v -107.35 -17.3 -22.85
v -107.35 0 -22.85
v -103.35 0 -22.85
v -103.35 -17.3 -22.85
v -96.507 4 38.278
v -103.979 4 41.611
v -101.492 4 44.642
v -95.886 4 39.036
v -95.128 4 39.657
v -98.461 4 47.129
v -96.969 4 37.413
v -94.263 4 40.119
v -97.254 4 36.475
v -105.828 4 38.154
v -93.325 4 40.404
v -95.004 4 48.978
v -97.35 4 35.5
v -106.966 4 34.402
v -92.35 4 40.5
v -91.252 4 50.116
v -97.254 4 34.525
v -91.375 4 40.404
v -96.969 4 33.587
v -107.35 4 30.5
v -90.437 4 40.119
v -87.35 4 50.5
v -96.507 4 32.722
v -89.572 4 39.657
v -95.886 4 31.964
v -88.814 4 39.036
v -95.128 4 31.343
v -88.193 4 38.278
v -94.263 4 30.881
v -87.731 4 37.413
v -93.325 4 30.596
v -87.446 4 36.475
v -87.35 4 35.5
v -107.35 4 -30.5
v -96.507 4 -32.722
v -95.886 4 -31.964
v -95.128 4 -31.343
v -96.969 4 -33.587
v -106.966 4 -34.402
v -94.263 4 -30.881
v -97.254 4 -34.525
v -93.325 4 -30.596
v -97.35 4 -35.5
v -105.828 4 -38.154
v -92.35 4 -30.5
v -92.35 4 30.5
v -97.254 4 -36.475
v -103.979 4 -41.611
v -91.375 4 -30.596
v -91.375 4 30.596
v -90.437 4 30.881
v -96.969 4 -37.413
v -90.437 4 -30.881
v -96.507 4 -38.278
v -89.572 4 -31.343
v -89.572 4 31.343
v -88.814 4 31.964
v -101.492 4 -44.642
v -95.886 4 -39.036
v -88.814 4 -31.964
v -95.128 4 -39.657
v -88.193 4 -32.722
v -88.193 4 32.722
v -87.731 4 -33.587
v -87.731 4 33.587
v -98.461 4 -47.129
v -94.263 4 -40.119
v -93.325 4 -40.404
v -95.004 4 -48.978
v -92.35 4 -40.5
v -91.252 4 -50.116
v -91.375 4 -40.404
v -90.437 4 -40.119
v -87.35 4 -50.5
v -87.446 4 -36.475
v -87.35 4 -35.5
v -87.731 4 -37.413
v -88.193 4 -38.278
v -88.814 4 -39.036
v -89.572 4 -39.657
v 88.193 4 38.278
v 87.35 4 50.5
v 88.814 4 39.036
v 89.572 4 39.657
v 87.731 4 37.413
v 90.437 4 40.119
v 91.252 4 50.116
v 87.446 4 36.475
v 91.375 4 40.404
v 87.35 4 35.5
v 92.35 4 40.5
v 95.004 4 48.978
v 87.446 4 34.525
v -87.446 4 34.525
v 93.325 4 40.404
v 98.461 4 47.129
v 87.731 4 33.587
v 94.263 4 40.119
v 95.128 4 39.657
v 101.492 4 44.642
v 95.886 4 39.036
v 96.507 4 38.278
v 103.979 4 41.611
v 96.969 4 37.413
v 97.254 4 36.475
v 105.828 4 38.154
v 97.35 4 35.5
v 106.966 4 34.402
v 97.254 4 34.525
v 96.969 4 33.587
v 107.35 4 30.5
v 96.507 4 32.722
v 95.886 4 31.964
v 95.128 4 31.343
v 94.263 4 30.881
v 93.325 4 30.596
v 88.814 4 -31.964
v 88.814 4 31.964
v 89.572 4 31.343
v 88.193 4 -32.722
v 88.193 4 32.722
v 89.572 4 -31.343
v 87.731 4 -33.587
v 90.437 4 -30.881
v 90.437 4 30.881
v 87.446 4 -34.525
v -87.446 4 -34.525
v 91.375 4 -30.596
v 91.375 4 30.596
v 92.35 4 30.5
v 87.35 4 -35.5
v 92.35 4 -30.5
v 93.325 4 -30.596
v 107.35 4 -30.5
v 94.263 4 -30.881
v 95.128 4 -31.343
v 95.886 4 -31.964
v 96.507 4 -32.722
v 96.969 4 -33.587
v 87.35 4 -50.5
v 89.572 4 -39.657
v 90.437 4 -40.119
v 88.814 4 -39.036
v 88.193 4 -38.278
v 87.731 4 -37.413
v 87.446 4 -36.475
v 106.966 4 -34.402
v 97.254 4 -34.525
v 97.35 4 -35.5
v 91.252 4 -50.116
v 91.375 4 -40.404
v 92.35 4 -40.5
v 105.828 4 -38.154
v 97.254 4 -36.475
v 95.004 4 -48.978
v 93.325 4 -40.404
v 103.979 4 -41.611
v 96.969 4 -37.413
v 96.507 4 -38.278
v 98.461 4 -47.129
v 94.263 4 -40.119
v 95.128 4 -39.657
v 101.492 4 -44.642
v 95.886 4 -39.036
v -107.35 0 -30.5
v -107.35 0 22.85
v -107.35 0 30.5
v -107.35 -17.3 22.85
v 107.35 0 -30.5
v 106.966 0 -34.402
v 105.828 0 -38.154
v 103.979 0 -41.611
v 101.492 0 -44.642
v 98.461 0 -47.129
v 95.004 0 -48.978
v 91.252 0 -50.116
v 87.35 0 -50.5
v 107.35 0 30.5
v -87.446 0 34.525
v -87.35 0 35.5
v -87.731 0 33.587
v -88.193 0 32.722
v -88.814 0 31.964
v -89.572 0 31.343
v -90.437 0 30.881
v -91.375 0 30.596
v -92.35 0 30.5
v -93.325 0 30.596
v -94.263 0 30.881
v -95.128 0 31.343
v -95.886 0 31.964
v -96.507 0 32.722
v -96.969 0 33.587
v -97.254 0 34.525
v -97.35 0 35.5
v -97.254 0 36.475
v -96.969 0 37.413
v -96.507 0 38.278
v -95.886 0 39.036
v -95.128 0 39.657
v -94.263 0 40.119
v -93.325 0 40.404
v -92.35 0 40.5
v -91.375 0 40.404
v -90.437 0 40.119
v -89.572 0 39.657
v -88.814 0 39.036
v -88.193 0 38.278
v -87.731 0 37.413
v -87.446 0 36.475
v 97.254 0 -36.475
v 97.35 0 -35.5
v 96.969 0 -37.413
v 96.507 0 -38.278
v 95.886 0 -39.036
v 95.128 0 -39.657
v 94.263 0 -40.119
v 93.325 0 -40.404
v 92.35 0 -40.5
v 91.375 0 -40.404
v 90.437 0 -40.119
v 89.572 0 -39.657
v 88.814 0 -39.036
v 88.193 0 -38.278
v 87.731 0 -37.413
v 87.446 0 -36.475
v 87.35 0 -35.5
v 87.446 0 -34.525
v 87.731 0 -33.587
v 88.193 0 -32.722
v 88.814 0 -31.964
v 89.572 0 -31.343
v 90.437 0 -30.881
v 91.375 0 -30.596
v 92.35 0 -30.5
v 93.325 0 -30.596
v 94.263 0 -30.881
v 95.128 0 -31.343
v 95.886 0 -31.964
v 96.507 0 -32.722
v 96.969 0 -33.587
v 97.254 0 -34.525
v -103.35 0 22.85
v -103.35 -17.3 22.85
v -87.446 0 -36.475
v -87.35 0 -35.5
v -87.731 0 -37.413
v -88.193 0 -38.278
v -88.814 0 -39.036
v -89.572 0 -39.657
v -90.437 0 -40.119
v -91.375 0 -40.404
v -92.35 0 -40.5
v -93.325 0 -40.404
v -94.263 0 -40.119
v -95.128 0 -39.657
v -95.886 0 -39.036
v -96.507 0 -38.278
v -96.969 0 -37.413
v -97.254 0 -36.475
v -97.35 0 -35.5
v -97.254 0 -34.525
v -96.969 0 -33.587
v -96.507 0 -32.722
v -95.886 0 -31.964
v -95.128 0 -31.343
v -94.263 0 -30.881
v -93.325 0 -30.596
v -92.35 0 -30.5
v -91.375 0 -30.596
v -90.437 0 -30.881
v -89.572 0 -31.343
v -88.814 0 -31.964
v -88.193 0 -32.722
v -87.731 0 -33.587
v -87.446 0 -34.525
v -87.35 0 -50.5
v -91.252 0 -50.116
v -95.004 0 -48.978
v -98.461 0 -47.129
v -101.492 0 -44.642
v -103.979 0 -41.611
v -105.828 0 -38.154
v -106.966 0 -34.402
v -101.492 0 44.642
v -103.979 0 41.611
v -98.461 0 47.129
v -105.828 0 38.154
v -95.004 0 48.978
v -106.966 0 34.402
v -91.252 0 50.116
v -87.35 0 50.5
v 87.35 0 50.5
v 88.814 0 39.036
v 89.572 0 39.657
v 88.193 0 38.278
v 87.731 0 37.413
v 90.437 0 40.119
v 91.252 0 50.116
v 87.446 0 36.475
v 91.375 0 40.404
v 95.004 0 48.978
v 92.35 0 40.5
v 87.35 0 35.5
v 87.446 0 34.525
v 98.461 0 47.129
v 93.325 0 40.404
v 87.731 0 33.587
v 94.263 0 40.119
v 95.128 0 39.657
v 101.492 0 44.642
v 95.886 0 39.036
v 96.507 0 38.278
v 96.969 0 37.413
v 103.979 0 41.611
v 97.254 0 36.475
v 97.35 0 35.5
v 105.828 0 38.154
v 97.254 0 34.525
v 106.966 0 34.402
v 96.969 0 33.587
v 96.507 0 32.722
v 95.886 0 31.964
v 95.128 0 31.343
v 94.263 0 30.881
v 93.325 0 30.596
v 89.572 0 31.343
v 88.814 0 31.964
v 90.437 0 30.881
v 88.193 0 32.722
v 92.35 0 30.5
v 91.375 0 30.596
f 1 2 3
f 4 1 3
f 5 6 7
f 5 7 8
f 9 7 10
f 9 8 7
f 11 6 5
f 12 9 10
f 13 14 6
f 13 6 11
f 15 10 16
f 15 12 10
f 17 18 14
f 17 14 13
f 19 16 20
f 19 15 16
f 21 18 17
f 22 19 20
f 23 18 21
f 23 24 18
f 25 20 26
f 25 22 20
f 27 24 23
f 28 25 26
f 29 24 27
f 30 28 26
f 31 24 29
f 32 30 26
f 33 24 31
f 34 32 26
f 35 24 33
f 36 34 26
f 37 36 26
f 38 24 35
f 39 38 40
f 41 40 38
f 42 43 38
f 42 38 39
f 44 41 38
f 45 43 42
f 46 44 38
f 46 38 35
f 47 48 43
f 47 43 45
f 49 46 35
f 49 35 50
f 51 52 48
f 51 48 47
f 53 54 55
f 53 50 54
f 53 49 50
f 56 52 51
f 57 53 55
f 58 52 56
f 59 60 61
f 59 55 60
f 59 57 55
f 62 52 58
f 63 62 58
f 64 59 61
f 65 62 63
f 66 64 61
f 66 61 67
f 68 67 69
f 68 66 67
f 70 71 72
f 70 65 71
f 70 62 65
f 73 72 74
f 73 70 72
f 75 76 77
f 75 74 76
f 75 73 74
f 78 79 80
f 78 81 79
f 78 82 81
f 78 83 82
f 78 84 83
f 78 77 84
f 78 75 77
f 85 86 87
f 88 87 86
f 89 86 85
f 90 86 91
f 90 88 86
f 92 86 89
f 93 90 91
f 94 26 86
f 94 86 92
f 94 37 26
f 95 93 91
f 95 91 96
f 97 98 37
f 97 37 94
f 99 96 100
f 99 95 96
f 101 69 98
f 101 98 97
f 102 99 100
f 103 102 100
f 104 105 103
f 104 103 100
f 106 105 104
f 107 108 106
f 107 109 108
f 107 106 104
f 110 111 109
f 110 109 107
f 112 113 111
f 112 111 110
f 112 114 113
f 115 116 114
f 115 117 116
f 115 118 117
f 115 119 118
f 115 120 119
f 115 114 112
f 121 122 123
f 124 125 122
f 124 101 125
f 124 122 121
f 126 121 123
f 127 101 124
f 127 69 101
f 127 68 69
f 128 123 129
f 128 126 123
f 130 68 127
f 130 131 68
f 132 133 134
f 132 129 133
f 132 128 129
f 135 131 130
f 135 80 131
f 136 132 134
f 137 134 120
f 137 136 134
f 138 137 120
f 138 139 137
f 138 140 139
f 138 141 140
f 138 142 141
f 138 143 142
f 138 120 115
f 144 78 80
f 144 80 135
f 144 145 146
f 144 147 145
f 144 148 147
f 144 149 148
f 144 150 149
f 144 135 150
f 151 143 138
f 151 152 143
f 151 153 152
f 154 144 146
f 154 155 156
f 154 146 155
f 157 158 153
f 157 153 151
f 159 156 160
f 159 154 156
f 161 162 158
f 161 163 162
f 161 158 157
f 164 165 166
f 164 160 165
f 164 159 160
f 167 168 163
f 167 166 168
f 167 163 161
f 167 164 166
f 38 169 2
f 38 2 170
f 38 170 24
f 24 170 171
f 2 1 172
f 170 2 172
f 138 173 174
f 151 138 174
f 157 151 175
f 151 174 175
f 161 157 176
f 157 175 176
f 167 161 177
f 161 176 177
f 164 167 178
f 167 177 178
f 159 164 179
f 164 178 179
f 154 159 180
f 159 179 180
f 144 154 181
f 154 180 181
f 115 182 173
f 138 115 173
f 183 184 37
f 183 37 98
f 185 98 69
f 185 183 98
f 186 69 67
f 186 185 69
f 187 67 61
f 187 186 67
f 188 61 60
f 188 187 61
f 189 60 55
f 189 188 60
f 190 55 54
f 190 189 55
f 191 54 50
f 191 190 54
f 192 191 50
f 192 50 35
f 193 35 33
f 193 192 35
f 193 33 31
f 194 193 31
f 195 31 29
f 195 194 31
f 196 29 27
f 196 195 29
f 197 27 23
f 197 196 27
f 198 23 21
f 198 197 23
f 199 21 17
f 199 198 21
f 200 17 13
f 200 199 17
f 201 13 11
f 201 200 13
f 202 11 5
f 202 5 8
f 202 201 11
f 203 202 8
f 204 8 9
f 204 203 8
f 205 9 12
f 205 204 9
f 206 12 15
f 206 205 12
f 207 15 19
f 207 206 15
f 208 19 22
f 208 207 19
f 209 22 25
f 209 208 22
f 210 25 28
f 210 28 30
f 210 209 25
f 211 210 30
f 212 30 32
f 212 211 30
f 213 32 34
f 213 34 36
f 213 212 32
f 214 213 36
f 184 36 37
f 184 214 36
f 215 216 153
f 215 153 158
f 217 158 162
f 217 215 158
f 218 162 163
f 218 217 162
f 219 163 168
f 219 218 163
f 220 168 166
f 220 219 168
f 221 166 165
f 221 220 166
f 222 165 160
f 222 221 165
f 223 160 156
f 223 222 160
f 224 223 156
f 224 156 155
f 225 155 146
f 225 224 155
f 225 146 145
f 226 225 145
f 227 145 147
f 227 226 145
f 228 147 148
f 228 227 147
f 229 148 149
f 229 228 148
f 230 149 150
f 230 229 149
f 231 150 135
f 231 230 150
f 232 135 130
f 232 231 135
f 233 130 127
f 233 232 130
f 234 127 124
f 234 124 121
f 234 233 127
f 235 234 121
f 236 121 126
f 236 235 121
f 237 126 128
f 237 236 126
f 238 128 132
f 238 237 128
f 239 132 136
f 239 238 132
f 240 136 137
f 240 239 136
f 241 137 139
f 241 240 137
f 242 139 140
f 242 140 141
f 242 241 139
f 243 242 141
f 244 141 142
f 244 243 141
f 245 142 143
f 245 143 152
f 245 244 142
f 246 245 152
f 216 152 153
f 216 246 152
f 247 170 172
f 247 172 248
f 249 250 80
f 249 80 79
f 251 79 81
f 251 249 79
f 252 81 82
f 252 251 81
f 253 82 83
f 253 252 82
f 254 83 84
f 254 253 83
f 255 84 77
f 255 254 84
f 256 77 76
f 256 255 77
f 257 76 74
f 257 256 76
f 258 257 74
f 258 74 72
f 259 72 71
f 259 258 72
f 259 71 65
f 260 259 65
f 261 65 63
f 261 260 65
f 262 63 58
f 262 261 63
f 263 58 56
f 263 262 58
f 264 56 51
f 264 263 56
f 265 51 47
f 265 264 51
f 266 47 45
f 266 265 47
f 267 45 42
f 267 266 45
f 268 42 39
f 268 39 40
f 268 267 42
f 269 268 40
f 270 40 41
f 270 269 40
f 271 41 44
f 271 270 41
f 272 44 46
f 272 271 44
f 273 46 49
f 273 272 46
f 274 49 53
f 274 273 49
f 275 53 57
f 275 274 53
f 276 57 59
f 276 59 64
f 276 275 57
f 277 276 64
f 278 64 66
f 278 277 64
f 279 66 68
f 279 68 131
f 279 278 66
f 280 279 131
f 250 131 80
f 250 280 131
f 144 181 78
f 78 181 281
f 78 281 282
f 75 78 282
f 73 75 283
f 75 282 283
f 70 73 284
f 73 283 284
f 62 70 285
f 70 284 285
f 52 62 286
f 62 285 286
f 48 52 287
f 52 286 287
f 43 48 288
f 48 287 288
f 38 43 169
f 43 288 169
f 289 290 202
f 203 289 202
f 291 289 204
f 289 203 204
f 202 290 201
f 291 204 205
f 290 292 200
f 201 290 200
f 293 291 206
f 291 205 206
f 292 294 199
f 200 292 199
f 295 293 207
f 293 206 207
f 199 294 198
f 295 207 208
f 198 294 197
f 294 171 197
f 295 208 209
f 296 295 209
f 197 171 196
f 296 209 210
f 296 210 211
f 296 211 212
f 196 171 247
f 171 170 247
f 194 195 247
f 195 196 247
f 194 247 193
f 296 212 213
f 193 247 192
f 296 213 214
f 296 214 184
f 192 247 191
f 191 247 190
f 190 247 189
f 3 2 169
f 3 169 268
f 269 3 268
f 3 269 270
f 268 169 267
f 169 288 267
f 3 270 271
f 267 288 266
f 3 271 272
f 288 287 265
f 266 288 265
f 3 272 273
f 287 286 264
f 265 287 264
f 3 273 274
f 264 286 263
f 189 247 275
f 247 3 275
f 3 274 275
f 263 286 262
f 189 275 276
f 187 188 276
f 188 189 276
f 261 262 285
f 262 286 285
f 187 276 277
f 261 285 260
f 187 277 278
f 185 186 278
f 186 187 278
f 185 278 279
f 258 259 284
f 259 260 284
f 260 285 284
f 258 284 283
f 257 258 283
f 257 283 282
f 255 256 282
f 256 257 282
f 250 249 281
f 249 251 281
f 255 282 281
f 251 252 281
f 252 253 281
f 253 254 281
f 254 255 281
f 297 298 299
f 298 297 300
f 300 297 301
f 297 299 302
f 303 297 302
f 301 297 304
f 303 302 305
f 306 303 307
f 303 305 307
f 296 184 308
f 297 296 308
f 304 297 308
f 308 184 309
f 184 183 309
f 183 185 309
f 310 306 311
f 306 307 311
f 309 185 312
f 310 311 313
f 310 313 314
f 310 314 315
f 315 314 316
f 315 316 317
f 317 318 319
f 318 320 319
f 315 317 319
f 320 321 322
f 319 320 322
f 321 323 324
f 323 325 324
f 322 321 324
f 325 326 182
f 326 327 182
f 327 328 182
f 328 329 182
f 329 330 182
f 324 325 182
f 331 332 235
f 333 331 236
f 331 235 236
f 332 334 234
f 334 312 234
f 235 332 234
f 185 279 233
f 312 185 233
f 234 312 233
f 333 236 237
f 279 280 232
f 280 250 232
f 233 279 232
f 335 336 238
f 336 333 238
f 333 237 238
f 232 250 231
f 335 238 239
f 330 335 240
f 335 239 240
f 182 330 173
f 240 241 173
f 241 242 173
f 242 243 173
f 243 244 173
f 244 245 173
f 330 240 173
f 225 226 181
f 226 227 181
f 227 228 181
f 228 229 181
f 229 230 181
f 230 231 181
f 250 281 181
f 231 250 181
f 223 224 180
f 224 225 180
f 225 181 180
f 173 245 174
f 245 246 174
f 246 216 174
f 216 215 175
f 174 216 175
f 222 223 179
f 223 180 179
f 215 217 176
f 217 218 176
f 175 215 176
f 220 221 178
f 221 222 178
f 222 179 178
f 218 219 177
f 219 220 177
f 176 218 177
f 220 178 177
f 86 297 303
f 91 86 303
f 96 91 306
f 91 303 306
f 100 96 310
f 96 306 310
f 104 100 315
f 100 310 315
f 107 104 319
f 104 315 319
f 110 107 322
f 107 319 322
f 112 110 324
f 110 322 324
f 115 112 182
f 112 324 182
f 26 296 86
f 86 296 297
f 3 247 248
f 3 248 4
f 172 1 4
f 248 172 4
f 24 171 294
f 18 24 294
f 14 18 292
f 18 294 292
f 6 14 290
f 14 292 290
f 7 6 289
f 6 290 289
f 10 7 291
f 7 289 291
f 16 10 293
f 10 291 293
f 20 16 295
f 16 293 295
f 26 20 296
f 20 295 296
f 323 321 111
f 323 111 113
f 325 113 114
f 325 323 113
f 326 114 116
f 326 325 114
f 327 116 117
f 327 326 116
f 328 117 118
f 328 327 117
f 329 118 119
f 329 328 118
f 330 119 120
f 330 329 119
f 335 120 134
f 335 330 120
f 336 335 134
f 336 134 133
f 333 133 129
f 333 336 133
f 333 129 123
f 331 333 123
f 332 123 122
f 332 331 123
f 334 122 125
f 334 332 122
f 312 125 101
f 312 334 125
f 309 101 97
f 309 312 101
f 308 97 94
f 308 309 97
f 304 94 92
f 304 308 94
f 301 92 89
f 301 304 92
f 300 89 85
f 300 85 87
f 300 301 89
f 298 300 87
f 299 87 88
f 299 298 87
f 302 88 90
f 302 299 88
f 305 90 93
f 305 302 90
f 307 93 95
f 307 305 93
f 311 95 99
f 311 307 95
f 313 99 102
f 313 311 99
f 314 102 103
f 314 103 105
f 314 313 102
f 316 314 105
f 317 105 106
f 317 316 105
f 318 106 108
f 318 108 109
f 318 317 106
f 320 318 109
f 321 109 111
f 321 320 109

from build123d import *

# Parameters (mm, degrees)
SKETCH1_R           = 5
BOSS_EXTRUDE1_DEPTH = 4
SKETCH2_W           = 4
SKETCH2_H           = 45.7
BOSS_EXTRUDE2_DEPTH = 21.3


with BuildPart() as part:
    # Sketch1 → Boss-Extrude1 (new body)
    with BuildSketch(Plane(origin=(0, 0, 0), x_dir=(1, 0, 0), z_dir=(0, 1, 0))):
        with BuildLine():
            Line((-87.35, -50.5), (87.35, -50.5))
            ThreePointArc((87.35, -50.5), (101.492135624, -44.642135624), (107.35, -30.5))
            Line((107.35, -30.5), (107.35, 30.5))
            ThreePointArc((107.35, 30.5), (101.492135624, 44.642135624), (87.35, 50.5))
            Line((87.35, 50.5), (-87.35, 50.5))
            ThreePointArc((-87.35, 50.5), (-101.492135624, 44.642135624), (-107.35, 30.5))
            Line((-107.35, 30.5), (-107.35, -30.5))
            ThreePointArc((-107.35, -30.5), (-101.492135624, -44.642135624), (-87.35, -50.5))
        make_face()
        with Locations((-92.35, 35.5)):
            Circle(SKETCH1_R, mode=Mode.SUBTRACT)
        with Locations((92.35, 35.5)):
            Circle(SKETCH1_R, mode=Mode.SUBTRACT)
        with Locations((92.35, -35.5)):
            Circle(SKETCH1_R, mode=Mode.SUBTRACT)
        with Locations((-92.35, -35.5)):
            Circle(SKETCH1_R, mode=Mode.SUBTRACT)
    extrude(amount=BOSS_EXTRUDE1_DEPTH)

    # Sketch2 → Boss-Extrude2 (add)
    with BuildSketch(Plane(origin=(0, 4, 0), x_dir=(1, 0, 0), z_dir=(0, 1, 0))):
        with Locations((-105.35, 0)):
            Rectangle(SKETCH2_W, SKETCH2_H)
    extrude(amount=-BOSS_EXTRUDE2_DEPTH)


solid = part.part
